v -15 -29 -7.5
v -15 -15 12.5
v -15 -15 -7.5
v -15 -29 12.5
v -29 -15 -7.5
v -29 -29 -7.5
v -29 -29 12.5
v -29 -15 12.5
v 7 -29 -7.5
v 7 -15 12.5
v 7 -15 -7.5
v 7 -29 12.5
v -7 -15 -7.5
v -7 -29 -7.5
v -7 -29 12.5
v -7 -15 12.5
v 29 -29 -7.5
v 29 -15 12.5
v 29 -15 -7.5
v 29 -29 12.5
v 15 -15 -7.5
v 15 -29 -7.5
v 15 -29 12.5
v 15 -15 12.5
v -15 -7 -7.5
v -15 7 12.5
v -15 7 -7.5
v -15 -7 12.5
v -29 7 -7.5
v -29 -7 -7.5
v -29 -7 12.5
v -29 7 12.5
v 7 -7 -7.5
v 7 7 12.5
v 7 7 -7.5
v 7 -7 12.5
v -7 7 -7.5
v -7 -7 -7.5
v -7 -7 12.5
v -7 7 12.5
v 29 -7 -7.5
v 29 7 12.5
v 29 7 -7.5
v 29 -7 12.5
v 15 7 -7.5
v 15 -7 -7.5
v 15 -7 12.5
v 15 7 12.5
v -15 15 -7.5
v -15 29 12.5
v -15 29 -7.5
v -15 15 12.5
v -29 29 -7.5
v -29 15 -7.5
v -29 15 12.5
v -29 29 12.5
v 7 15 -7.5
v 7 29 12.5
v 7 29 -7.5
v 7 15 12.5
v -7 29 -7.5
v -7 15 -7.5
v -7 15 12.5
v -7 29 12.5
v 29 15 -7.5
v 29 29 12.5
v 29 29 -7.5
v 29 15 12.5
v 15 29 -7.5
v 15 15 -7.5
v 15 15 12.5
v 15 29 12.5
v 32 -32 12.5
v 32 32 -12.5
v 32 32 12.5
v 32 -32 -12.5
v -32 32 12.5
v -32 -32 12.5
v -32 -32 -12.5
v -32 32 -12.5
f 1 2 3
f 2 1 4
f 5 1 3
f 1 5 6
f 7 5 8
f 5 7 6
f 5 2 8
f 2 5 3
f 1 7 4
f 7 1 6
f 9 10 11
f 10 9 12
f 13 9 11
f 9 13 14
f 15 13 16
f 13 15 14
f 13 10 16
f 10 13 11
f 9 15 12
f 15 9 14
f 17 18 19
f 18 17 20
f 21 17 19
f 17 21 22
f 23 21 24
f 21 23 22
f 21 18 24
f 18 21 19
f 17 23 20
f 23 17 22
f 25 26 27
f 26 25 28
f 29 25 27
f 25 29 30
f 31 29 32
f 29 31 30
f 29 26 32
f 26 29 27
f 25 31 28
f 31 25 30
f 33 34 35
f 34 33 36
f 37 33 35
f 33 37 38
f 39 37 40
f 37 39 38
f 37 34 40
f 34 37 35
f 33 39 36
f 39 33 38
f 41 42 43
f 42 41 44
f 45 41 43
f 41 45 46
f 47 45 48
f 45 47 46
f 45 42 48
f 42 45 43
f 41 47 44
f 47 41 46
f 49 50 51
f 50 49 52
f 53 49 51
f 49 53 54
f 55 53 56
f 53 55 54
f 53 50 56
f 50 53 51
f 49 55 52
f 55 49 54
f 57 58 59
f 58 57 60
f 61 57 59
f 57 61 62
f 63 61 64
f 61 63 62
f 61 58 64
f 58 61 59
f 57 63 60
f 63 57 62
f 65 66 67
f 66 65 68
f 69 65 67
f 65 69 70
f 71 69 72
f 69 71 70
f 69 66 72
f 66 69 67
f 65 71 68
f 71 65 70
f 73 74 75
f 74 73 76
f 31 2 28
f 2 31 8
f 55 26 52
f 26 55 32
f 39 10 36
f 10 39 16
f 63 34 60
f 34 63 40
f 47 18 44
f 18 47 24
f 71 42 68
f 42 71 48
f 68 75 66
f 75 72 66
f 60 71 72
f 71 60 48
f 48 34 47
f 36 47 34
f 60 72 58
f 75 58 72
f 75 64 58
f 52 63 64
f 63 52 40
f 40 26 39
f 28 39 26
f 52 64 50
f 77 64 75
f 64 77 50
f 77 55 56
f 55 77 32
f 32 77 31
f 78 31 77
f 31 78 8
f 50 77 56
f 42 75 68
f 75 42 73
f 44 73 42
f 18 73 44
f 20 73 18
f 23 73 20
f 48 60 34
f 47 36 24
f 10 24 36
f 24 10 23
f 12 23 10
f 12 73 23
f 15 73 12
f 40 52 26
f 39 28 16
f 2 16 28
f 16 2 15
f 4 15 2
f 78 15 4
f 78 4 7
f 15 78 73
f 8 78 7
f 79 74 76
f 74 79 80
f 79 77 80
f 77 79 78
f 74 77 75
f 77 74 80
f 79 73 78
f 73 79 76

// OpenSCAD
$fn = 32;

// ----------------------------------------------------------------------
// Pocket plate 64 x 64 x 25
// 3 x 3 pockets 14 mm square, 20 mm deep
// ----------------------------------------------------------------------

// --- parameters (mm) ---
thickness = 25;  // plate thickness
floor_t = 5;     // material left under each pocket
pocket = 14;     // pocket side length
pitch_x = 22;    // pocket pitch along X
pitch_y = 22;    // pocket pitch along Y
cols = 3;        // pockets per row
rows = 3;        // rows of pockets

// --- derived feature positions (mm) ---
depth = thickness - floor_t;        // = 20   pocket depth, down to the floor
span_x = (cols - 1) * pitch_x;      // = 44   distance between outer pockets
span_y = (rows - 1) * pitch_y;      // = 44   distance between outer pocket rows
origin_x = -span_x / 2;             // = -22   X of the first pocket
origin_y = -span_y / 2;             // = -22   Y of the first pocket
plate = [span_x + pocket + 6, span_y + pocket + 6, thickness];  // = [64, 64, 25]   overall size: pockets plus 3 mm of wall on each side
feature_centers = [
  [origin_x + 0 * pitch_x, origin_y + 0 * pitch_y],
  [origin_x + 1 * pitch_x, origin_y + 0 * pitch_y],
  [origin_x + 2 * pitch_x, origin_y + 0 * pitch_y],
  [origin_x + 0 * pitch_x, origin_y + 1 * pitch_y],
  [origin_x + 1 * pitch_x, origin_y + 1 * pitch_y],
  [origin_x + 2 * pitch_x, origin_y + 1 * pitch_y],
  [origin_x + 0 * pitch_x, origin_y + 2 * pitch_y],
  [origin_x + 1 * pitch_x, origin_y + 2 * pitch_y],
  [origin_x + 2 * pitch_x, origin_y + 2 * pitch_y]
];   // pocket centres, used verbatim by the cutter loop

// plate outline, then one pocket per centre in feature_centers
difference() {
  cube(plate, center = true);
  for (centre = feature_centers)
    translate([centre[0] - pocket / 2, centre[1] - pocket / 2, plate[2] / 2 - depth])
      cube([pocket, pocket, depth + 1]);  // centred on the declared pocket centre
}
